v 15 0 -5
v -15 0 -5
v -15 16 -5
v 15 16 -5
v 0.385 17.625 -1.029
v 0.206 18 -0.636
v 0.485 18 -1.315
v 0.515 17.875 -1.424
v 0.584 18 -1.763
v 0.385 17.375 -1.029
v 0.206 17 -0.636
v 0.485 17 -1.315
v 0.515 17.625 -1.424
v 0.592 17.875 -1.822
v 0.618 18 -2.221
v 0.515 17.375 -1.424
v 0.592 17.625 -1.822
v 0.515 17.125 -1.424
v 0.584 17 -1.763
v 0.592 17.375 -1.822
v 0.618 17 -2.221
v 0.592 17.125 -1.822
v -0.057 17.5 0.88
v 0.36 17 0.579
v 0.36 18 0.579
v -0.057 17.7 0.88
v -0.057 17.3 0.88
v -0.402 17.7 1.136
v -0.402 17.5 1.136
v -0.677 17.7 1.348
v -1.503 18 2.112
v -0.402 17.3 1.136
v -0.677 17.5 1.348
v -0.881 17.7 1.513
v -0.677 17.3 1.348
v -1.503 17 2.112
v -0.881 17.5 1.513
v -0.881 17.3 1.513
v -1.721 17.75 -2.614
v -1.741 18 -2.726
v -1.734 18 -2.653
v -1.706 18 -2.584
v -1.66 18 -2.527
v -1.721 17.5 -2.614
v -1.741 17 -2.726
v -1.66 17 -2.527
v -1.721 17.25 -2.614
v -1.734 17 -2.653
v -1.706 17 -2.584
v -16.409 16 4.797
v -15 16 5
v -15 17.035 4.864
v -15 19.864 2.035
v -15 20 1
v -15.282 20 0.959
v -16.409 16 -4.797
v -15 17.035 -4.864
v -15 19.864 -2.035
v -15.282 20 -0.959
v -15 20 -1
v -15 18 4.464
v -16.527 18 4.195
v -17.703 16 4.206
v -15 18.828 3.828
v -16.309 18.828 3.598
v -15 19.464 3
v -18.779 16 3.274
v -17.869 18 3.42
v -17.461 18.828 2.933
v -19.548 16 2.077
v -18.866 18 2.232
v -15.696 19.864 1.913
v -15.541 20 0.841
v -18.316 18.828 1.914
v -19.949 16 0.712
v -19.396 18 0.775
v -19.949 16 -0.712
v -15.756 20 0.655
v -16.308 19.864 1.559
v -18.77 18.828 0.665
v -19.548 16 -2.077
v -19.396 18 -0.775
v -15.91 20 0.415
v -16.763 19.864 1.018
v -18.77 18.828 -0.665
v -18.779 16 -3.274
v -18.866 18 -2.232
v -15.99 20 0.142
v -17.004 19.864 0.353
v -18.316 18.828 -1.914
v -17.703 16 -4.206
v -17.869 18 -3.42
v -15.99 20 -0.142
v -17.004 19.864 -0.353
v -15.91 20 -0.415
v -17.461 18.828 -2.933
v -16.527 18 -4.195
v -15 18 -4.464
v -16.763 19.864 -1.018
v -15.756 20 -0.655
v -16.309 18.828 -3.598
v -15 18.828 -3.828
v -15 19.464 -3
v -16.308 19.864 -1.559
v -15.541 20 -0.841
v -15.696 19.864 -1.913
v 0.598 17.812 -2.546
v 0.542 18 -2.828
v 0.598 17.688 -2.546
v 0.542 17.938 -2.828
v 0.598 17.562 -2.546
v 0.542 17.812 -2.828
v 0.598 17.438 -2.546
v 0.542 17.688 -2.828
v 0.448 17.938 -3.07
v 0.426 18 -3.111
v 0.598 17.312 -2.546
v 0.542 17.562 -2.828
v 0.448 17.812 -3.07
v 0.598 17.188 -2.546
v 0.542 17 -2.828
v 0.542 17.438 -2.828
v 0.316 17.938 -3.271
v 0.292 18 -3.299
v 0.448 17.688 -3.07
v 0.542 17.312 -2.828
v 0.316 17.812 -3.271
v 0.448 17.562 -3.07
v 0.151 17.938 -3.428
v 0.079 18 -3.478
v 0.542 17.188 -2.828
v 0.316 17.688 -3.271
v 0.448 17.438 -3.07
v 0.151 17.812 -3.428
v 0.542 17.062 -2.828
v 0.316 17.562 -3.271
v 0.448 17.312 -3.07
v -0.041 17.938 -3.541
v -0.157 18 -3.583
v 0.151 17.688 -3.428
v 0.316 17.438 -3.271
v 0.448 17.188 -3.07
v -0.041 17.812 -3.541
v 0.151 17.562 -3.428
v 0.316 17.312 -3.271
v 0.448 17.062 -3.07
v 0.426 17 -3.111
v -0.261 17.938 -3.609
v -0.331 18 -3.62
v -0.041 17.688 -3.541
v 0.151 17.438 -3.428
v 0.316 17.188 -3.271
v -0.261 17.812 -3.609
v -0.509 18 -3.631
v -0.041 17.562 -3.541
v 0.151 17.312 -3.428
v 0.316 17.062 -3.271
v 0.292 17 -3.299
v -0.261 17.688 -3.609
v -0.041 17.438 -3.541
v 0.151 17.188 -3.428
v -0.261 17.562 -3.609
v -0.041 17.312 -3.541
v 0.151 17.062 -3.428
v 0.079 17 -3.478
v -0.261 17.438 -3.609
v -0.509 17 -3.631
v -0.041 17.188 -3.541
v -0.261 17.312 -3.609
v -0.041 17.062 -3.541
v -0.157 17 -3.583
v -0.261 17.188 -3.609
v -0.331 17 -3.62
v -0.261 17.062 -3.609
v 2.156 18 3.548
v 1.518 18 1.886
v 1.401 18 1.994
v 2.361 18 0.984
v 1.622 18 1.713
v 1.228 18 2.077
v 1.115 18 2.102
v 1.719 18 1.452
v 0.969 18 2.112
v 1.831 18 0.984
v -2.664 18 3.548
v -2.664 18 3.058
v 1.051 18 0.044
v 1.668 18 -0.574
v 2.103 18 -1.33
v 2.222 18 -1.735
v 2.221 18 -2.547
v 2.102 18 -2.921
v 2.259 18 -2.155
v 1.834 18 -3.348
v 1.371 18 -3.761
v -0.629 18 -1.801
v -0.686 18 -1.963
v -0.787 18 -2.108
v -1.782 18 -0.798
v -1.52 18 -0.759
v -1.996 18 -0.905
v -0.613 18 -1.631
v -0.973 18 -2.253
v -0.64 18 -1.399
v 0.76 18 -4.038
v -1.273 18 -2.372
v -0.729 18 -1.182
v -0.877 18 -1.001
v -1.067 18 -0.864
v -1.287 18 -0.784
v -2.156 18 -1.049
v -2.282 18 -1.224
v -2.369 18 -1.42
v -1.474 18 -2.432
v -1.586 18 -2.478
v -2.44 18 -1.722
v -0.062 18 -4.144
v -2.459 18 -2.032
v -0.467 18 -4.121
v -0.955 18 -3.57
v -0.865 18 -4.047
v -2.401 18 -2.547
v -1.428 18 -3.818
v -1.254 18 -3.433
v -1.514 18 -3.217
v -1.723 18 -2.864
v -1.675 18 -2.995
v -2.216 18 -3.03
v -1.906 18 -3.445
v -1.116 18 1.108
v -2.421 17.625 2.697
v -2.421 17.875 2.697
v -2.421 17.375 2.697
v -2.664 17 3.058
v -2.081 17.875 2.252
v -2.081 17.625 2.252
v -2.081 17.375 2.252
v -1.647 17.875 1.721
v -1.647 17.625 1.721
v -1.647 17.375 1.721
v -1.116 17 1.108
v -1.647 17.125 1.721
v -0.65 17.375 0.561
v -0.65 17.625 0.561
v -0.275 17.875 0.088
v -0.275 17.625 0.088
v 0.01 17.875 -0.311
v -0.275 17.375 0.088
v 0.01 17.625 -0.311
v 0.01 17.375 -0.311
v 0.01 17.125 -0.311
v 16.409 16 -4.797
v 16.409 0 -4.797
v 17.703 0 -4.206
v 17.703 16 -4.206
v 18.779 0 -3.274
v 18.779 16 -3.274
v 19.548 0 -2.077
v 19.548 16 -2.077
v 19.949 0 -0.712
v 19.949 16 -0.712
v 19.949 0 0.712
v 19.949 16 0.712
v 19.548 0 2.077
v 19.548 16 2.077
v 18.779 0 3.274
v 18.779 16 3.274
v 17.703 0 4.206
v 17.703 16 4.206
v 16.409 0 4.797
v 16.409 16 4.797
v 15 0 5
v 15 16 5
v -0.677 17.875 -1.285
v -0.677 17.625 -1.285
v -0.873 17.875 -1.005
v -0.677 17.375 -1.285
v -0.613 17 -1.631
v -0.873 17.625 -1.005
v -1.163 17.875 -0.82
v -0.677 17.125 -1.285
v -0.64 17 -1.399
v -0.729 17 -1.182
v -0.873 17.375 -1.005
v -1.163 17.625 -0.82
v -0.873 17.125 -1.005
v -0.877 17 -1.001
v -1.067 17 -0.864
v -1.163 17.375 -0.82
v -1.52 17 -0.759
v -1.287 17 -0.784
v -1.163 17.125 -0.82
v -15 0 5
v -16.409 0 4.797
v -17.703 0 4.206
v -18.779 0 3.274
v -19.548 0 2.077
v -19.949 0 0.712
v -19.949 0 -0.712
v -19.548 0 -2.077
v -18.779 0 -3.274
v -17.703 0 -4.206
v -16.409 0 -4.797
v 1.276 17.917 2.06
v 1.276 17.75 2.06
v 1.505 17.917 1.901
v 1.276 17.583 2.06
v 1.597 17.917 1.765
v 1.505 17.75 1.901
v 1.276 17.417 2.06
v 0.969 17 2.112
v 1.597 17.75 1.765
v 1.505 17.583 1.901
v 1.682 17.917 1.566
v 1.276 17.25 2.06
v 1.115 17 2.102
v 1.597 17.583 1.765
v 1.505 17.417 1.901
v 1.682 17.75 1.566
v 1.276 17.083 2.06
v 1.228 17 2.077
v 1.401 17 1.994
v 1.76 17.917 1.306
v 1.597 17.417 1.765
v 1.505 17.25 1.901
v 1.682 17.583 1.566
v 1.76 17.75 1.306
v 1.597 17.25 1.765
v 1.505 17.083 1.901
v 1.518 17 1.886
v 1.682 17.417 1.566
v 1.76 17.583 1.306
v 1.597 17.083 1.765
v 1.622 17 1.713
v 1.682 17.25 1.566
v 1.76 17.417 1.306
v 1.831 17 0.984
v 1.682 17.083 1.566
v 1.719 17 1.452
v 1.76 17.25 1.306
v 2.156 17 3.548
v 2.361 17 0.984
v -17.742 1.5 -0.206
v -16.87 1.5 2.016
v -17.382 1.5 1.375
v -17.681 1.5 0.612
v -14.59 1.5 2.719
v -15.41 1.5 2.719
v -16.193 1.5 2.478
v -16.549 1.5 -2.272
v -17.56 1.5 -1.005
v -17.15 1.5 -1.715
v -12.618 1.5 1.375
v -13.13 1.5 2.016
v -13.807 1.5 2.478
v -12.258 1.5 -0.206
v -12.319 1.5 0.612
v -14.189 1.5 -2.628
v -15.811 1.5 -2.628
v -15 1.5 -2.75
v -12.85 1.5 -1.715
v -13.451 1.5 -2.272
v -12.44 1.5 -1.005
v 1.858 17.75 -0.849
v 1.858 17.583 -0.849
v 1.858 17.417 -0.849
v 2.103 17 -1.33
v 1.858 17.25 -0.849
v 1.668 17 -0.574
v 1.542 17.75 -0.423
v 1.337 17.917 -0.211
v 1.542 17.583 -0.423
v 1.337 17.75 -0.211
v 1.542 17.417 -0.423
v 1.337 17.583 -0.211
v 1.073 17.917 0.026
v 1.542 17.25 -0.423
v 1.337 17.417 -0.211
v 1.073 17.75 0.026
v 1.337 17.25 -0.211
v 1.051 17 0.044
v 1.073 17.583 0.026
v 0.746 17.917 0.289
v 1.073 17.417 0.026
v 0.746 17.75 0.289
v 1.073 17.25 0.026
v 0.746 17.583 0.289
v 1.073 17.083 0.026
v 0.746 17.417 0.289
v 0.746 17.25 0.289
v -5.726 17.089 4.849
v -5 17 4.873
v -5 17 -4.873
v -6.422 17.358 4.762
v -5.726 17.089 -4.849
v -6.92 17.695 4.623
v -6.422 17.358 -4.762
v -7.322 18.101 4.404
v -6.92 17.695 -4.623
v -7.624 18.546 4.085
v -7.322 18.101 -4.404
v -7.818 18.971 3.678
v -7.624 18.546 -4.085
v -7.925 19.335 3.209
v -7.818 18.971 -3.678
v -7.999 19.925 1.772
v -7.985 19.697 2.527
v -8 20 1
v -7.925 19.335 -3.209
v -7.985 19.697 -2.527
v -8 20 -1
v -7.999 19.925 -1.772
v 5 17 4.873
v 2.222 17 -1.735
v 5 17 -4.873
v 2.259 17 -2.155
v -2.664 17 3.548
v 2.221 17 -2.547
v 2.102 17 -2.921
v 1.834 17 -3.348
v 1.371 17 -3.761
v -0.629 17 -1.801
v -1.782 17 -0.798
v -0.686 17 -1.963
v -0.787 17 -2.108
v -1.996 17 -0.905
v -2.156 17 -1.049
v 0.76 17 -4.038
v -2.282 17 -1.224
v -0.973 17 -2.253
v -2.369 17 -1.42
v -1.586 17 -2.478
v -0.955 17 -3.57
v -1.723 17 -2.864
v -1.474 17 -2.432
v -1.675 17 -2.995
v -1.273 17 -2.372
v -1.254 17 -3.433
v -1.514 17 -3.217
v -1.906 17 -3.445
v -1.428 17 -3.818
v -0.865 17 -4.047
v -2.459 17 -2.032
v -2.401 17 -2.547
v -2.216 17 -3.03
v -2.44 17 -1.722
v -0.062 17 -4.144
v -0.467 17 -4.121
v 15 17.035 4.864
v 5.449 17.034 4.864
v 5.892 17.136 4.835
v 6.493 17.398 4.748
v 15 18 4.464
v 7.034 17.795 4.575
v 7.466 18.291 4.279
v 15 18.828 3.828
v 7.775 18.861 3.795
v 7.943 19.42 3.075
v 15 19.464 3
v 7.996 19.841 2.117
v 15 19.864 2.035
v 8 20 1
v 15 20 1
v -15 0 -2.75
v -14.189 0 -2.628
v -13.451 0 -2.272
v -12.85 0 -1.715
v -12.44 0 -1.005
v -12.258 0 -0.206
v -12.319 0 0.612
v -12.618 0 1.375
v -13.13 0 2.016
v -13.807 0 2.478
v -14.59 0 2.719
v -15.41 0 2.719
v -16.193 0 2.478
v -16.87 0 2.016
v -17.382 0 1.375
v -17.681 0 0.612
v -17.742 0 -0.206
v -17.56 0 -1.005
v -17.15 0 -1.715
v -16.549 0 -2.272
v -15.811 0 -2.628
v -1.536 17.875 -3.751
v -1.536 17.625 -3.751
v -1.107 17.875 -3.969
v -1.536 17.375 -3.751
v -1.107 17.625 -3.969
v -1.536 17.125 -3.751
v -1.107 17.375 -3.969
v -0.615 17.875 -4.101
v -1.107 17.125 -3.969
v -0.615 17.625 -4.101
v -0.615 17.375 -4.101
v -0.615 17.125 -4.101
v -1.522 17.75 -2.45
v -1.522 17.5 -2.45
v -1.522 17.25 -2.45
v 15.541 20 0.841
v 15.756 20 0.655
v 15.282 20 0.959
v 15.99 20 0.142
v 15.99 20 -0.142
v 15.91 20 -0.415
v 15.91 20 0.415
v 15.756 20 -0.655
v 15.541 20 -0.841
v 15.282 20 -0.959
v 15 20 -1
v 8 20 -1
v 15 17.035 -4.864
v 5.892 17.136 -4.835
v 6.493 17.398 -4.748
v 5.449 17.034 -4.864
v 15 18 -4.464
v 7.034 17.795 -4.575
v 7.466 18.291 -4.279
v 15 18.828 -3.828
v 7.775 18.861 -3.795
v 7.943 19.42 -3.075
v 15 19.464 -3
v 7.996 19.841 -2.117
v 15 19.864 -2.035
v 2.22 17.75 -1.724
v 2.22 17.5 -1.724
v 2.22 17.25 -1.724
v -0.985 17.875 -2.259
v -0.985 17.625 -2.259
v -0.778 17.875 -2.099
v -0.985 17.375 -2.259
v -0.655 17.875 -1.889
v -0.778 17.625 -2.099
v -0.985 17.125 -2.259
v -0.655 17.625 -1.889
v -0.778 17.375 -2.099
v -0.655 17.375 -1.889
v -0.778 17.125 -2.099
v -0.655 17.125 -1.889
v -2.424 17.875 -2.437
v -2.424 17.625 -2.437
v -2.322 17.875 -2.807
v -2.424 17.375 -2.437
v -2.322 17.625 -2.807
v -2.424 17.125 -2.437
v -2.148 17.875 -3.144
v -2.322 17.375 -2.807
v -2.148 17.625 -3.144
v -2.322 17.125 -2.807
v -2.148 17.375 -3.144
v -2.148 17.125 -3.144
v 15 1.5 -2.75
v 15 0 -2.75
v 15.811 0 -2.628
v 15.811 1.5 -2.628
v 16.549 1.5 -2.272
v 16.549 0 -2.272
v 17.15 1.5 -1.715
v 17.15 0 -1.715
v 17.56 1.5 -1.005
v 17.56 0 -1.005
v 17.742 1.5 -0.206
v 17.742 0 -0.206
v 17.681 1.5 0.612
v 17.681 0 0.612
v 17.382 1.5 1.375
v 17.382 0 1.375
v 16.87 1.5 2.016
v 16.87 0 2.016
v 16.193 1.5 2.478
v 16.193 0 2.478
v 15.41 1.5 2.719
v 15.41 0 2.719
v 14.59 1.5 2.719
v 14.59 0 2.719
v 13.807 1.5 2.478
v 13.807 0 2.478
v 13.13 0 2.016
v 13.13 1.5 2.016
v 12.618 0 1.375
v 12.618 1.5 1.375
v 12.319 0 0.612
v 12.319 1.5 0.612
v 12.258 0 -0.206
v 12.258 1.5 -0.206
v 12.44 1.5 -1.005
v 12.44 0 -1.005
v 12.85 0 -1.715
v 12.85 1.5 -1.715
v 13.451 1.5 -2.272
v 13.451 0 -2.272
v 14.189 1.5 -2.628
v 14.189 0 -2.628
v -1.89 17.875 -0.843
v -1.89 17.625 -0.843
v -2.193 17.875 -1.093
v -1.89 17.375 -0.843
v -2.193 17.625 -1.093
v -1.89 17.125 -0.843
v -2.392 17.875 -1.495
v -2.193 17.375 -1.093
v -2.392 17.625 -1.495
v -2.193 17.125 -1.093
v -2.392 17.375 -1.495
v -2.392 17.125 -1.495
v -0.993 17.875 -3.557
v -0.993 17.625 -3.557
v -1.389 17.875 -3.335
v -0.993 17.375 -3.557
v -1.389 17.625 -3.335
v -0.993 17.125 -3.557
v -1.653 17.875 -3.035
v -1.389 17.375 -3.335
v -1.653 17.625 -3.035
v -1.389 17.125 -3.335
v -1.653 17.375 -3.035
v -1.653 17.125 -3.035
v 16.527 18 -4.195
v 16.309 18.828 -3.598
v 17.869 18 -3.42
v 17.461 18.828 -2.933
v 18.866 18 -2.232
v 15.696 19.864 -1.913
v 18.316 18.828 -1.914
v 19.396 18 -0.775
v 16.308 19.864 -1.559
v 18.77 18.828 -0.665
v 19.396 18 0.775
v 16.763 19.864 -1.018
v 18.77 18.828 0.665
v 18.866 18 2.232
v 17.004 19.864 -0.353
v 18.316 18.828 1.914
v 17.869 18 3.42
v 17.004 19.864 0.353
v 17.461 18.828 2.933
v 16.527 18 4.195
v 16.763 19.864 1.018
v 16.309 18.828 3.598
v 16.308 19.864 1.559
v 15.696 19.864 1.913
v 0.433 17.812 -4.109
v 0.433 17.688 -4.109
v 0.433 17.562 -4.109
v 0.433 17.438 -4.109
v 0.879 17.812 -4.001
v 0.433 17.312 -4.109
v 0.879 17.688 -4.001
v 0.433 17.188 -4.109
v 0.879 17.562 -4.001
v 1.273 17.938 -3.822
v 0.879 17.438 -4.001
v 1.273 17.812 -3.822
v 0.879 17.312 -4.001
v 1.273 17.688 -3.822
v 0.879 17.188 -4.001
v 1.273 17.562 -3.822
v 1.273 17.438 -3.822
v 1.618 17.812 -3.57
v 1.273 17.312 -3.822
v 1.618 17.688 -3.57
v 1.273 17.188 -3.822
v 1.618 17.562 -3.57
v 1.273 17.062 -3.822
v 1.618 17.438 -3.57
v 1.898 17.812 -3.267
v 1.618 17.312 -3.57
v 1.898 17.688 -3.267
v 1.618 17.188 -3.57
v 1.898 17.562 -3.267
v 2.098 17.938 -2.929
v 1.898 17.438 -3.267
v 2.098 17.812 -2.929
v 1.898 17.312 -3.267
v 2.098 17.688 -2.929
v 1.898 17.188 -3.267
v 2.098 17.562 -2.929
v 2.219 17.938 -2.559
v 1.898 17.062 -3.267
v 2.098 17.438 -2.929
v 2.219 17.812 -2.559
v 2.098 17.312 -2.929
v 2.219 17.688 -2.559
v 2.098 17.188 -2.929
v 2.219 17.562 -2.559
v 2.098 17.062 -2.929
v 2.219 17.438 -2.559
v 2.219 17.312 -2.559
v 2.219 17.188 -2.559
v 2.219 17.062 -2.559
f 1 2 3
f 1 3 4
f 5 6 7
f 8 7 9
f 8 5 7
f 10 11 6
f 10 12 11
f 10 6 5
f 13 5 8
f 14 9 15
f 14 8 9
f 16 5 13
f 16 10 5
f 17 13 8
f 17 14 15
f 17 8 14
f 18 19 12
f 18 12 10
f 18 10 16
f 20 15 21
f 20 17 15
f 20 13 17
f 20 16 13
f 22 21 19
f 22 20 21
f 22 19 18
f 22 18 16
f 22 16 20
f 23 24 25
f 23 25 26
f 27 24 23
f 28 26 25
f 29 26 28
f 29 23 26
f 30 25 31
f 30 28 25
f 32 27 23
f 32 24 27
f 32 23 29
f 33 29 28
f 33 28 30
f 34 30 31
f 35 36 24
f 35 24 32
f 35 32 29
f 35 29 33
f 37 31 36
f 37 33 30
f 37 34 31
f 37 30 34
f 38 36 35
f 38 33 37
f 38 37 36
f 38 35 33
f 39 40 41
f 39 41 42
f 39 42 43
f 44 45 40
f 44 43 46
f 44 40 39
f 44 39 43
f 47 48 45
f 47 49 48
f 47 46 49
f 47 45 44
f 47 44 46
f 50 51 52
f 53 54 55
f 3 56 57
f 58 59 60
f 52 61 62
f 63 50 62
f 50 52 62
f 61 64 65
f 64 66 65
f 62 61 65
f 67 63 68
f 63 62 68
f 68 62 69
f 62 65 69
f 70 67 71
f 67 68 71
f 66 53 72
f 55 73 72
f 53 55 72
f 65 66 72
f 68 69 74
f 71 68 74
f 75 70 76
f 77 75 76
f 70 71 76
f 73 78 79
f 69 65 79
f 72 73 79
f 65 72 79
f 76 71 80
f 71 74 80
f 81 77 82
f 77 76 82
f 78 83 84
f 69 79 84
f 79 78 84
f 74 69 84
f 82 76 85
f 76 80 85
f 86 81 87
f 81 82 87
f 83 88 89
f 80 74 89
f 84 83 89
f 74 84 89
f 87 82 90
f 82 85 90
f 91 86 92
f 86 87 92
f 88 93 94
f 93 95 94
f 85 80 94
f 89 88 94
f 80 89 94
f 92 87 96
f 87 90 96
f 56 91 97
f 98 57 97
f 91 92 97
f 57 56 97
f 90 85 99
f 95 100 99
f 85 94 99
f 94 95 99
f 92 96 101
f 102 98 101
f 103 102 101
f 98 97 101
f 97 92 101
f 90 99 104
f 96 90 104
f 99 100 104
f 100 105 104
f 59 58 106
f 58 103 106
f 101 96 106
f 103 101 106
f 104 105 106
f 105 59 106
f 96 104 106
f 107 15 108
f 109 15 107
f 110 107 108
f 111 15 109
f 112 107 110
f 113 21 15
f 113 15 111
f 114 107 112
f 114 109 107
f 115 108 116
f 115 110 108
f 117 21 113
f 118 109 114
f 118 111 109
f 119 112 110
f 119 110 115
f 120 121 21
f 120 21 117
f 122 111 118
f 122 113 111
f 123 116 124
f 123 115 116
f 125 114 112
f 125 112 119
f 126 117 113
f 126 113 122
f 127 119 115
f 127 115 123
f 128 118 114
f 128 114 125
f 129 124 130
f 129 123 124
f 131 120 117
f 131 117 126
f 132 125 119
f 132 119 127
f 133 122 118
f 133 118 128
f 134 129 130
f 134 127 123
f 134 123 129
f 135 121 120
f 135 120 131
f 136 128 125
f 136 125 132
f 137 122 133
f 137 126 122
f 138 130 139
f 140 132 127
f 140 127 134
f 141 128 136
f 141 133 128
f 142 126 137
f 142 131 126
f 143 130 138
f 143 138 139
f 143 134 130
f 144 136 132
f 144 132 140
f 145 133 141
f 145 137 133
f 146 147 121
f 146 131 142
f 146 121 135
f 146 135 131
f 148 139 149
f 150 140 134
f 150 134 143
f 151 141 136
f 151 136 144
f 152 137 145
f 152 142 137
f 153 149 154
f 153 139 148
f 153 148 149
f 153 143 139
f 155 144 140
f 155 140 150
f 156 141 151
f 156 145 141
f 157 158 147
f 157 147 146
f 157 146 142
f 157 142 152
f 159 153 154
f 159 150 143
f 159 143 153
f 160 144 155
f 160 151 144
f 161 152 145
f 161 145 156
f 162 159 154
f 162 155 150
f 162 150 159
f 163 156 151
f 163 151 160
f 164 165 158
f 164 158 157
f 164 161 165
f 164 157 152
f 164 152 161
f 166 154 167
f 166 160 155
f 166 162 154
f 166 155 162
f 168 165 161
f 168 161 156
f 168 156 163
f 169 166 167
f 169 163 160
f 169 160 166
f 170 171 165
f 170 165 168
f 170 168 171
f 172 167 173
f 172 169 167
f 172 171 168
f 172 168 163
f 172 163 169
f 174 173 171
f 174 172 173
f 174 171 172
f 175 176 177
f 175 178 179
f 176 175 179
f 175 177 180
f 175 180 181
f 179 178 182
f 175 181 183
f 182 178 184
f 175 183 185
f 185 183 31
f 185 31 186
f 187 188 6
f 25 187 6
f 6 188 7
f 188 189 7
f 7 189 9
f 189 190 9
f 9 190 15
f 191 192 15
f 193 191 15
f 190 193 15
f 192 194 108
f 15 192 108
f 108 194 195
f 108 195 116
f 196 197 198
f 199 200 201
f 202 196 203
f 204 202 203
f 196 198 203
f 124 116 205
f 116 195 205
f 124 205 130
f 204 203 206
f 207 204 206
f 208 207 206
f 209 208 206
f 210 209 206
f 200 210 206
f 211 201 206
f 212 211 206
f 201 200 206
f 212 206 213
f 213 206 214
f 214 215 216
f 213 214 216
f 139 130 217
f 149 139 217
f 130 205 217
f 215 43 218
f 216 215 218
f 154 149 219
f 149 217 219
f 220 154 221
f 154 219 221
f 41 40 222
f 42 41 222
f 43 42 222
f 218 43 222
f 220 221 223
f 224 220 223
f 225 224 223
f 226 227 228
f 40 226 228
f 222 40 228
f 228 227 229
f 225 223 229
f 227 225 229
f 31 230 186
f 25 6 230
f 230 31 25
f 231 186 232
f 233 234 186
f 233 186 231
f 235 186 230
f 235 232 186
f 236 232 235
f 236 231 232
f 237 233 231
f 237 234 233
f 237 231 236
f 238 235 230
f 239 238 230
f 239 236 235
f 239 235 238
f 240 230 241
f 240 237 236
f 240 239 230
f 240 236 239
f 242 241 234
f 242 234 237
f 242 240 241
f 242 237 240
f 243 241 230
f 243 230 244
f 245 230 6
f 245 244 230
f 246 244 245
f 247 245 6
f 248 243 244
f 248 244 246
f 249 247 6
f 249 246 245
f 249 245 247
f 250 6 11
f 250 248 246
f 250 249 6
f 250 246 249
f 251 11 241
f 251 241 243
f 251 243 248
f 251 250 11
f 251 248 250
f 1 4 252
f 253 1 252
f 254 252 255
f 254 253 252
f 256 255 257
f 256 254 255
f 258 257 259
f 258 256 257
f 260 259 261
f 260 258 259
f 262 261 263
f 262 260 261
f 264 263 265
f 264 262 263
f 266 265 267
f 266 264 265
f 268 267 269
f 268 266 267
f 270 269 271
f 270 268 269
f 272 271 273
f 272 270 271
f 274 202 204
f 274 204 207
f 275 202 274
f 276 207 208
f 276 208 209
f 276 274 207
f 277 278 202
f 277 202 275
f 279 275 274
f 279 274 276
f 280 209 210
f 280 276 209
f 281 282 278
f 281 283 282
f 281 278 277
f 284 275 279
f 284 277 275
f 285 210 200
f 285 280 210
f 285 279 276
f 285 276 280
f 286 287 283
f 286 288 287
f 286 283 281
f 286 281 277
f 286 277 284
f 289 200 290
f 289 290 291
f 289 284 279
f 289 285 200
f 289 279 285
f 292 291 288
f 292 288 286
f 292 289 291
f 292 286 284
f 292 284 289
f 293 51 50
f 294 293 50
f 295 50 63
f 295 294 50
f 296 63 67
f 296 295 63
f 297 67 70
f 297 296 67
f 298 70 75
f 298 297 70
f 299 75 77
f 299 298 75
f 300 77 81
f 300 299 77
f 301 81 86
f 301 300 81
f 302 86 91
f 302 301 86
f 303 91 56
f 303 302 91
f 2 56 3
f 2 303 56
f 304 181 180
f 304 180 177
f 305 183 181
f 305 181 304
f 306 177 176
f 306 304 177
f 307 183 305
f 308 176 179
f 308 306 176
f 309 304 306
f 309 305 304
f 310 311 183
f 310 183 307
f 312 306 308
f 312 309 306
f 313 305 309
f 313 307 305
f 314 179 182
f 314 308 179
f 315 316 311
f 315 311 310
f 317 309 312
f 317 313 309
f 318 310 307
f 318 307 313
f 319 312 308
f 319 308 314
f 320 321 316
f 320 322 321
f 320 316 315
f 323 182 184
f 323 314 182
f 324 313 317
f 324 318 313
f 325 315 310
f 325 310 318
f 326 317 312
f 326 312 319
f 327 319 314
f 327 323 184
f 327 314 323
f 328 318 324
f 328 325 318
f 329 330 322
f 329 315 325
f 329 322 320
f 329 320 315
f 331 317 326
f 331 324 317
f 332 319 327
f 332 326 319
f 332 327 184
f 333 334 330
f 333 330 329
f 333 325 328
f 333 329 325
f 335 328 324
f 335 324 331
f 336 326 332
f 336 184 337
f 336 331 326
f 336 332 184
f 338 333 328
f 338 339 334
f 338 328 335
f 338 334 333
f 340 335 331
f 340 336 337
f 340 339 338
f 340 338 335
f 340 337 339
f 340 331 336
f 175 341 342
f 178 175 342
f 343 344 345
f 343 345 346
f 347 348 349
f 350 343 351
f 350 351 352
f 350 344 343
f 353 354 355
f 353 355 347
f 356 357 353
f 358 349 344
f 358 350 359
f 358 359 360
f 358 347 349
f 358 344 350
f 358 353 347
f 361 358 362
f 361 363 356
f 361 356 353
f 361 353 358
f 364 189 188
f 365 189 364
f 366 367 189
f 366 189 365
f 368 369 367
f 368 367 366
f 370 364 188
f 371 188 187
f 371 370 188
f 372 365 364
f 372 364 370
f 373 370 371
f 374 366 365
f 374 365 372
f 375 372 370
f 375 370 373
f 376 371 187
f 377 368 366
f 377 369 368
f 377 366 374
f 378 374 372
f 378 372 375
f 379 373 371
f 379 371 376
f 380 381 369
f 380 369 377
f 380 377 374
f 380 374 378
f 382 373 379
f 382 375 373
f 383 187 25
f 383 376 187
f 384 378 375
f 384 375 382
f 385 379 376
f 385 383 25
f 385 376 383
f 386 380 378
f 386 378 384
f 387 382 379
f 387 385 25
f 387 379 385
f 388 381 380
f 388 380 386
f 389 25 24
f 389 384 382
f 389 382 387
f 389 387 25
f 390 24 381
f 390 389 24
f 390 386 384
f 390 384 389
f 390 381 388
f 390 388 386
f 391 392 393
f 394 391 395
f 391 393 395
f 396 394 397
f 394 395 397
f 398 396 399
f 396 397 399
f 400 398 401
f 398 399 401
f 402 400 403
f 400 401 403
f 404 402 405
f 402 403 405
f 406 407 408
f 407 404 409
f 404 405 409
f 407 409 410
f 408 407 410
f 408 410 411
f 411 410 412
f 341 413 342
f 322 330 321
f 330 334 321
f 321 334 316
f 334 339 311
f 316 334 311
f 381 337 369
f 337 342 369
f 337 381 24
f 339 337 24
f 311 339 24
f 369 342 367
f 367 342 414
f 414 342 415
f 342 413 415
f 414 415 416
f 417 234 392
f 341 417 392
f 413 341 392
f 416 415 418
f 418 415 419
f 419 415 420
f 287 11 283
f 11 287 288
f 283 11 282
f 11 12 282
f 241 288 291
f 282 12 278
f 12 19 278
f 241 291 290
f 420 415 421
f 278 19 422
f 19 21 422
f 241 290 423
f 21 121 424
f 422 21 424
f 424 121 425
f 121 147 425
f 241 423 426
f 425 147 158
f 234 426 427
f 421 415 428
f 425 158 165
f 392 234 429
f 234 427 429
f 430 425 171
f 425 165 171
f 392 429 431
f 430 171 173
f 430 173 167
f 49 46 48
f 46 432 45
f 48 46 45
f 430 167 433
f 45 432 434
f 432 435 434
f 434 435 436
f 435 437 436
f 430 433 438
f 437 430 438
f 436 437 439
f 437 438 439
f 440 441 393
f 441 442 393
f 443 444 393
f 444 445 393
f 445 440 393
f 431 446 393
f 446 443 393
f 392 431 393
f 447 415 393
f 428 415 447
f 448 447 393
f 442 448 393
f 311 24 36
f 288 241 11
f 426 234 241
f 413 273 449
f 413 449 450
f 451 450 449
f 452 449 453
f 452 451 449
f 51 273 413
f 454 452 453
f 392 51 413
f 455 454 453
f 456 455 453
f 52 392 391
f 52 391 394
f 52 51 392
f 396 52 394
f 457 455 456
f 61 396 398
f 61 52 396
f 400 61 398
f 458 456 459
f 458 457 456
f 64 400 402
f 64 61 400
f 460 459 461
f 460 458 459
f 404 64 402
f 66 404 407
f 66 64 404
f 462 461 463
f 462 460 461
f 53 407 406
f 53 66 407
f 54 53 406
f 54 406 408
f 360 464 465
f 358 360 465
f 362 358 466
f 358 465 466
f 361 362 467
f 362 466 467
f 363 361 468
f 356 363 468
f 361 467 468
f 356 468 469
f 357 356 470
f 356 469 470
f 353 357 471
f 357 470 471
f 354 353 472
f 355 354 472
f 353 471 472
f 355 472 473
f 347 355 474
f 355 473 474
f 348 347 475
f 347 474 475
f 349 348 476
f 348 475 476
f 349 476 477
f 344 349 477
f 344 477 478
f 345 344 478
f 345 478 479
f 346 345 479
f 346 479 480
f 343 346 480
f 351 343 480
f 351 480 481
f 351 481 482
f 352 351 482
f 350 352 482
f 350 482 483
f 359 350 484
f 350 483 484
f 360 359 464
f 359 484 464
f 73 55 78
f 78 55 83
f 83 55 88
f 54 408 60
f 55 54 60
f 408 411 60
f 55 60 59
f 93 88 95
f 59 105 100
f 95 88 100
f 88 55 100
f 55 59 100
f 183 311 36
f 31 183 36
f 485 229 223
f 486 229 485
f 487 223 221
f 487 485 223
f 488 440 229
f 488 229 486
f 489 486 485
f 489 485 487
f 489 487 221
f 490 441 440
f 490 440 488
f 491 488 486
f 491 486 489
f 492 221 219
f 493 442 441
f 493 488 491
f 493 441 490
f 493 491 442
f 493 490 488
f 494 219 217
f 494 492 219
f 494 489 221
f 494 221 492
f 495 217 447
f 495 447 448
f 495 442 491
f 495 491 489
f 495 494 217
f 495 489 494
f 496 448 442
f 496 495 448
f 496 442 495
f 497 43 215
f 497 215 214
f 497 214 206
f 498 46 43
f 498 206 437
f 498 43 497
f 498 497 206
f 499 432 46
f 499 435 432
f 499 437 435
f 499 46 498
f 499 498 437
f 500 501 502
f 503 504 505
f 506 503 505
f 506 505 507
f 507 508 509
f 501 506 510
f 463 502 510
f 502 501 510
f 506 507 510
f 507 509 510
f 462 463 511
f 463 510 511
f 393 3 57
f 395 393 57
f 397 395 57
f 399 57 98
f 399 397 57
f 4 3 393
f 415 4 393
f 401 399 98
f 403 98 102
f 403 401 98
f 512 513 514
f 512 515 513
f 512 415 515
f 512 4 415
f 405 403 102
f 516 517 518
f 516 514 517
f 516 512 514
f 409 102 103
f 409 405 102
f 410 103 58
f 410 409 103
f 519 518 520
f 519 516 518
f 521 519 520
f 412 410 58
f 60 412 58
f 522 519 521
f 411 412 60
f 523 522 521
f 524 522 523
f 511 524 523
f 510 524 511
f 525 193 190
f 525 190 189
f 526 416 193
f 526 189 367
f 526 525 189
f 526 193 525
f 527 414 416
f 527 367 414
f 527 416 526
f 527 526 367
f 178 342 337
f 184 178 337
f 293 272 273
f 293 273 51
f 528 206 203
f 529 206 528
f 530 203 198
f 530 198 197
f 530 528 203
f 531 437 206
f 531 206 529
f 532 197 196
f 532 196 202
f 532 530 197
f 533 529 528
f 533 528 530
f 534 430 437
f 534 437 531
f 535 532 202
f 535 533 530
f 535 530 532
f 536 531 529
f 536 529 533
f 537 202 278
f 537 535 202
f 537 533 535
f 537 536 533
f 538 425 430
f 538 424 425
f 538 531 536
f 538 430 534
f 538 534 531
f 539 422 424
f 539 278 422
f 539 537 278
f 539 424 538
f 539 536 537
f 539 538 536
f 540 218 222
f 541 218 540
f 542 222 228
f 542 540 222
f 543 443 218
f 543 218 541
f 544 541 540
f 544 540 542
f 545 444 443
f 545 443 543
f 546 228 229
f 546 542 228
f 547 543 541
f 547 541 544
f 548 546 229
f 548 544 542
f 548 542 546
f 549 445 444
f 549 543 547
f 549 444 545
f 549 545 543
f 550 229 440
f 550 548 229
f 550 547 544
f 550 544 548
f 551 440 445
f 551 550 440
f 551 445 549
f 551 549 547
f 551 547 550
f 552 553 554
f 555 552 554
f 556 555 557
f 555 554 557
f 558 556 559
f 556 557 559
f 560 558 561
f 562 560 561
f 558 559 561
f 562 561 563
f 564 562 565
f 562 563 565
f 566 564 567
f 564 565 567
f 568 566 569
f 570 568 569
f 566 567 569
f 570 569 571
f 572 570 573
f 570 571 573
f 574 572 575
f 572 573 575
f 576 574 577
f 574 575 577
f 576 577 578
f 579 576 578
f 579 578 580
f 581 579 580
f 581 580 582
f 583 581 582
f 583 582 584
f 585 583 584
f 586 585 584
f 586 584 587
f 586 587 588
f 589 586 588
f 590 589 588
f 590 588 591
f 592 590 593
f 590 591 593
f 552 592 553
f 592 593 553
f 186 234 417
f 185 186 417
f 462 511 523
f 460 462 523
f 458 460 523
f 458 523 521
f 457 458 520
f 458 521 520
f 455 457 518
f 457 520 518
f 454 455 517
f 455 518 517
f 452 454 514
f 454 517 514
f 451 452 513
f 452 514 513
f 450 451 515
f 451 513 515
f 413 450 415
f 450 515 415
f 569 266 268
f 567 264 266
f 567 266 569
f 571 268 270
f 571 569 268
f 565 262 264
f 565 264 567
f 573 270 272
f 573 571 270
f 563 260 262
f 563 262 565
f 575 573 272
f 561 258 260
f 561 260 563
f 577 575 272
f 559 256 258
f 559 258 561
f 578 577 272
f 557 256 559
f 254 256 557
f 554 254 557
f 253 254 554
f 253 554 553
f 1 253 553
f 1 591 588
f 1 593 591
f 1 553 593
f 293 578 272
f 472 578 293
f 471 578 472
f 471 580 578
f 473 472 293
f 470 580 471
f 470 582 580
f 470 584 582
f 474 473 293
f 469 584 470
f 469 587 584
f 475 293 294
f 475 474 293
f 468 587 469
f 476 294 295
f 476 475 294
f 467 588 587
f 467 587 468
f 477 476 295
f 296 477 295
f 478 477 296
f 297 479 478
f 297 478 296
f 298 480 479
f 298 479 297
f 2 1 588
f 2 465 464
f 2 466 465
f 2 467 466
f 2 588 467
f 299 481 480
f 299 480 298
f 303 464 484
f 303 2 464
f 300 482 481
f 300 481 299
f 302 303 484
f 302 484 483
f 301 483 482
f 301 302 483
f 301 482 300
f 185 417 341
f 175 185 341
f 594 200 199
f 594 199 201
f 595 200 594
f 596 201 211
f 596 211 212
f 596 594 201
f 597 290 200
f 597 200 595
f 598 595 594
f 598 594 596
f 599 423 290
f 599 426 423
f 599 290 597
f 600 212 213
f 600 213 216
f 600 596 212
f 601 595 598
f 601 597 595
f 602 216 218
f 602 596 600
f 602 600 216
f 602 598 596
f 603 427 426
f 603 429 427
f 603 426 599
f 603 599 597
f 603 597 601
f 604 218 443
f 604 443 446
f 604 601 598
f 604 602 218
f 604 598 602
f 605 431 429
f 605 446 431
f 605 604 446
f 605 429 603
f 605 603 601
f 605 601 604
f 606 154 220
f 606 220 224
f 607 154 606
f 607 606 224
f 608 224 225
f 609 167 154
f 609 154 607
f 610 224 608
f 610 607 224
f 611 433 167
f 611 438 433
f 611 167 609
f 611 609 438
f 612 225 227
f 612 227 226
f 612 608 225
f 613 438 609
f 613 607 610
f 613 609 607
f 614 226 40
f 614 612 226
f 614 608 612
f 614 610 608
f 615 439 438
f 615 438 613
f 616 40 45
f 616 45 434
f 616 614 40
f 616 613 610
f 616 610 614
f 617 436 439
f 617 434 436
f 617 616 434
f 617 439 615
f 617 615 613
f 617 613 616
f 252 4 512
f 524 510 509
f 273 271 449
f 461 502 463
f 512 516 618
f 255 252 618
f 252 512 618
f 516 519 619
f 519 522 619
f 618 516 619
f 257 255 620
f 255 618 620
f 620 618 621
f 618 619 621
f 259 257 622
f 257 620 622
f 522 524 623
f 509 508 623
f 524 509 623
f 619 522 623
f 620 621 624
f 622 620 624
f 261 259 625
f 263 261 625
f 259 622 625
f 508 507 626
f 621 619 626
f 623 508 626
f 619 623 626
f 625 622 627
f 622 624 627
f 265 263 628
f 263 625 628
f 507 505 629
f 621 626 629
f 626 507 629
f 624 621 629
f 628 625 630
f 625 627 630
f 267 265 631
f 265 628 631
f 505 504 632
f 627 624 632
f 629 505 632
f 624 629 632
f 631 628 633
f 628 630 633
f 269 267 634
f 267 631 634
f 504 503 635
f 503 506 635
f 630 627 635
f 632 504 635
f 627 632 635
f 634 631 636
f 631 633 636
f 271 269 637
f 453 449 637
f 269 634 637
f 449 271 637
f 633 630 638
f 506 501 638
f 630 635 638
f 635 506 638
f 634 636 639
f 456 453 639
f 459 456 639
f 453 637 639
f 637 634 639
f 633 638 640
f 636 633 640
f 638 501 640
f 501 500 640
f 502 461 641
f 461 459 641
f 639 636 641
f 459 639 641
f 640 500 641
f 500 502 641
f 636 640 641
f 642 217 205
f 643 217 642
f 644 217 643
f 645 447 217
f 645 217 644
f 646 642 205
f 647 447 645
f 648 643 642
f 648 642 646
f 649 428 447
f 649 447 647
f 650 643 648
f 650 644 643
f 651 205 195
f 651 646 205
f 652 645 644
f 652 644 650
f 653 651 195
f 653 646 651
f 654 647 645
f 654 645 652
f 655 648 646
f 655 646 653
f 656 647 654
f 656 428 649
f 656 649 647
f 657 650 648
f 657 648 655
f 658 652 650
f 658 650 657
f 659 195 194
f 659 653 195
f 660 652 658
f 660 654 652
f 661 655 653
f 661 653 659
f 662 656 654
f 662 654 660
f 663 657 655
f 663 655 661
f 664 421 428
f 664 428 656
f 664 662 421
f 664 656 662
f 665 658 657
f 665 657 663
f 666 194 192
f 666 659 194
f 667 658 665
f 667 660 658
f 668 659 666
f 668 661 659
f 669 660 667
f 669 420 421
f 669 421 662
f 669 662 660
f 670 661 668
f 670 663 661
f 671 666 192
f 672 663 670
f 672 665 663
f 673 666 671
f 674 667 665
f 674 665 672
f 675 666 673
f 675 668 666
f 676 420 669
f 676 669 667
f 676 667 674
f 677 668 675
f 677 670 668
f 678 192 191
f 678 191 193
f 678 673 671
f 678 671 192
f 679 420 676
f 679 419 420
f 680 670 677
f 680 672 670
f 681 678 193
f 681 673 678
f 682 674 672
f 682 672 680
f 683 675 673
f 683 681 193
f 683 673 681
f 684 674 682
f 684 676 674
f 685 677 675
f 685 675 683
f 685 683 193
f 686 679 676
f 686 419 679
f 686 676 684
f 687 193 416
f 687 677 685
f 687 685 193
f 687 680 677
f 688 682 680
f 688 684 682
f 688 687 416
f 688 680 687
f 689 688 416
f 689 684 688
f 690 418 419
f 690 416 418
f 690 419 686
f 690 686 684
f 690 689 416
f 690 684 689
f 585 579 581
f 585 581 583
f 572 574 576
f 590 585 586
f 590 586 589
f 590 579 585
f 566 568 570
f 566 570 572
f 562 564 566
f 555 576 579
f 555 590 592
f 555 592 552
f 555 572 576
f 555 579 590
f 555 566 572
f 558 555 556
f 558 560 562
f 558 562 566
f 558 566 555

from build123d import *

# Parameters (mm, degrees)
BOSS_EXTRUDE1_DEPTH     = 20
FILLET1_R               = 4
SKETCH2_R               = 2.75
CUT_EXTRUDE1_DEPTH      = 1.5
LPATTERN1_COUNT         = 2
LPATTERN1_PITCH         = 30
CUT_EXTRUDE2_DEPTH      = 29.722813233
CUT_EXTRUDE2_DEPTH_BACK = 29.722813233
WRAP1_DEPTH             = 1


# Read off the part's stored shape, not the designer's step: Wrap1
with BuildPart() as part:
    # Sketch1 → Boss-Extrude1 (new body)
    with BuildSketch(Plane(origin=(0, 0, 0), x_dir=(1, 0, 0), z_dir=(0, 1, 0))):
        with BuildLine():
            Line((15, -5), (-15, -5))
            ThreePointArc((-15, -5), (-20, 0), (-15, 5))
            Line((-15, 5), (15, 5))
            ThreePointArc((15, 5), (20, 0), (15, -5))
        make_face()
    extrude(amount=BOSS_EXTRUDE1_DEPTH)

    # Fillet1
    fillet1_edges = [part.edges().sort_by_distance(p)[0] for p in [
        (-20, 20, 0),
        (0, 20, 5),
        (20, 20, 0),
        (0, 20, -5),
    ]]
    fillet(fillet1_edges, radius=FILLET1_R)

    # Sketch2 → Cut-Extrude1 (cut)
    with BuildSketch(Plane.XZ):
        with Locations(Location((-15, 0, 0), (0, 0, 270))):
            Circle(SKETCH2_R)
    cut_extrude1 = extrude(amount=-CUT_EXTRUDE1_DEPTH, mode=Mode.SUBTRACT)

    # LPattern1: Cut-Extrude1 ×2
    with Locations(*[(i * LPATTERN1_PITCH, 0, 0) for i in range(1, LPATTERN1_COUNT)]):
        add(cut_extrude1, mode=Mode.SUBTRACT)

    # Sketch3 → Cut-Extrude2 (cut, two sides: drawn at the far end of the back side and taken through both)
    with BuildSketch(Plane.XY.offset(-CUT_EXTRUDE2_DEPTH_BACK)):
        with BuildLine():
            Line((-5, 23), (5, 23))
            ThreePointArc((5, 23), (8, 20), (5, 17))
            Line((5, 17), (-5, 17))
            ThreePointArc((-5, 17), (-8, 20), (-5, 23))
        make_face()
    extrude(amount=CUT_EXTRUDE2_DEPTH + CUT_EXTRUDE2_DEPTH_BACK, mode=Mode.SUBTRACT)

    # Wrap1 outline → Wrap1 (add)
    with BuildSketch(Plane(origin=(0, 17, 0), x_dir=(1, 0, 0), z_dir=(0, 1, 0))):
        with BuildLine():
            add(Edge.make_bspline(
                [(0.968558604, -2.112404227), (1.023340463, -2.110381468), (1.128135866, -2.106512015), (1.275421614, -2.065066433), (1.40411806, -1.999153831), (1.494113345, -1.918796765), (1.555259283, -1.8377784), (1.600182088, -1.761379971), (1.643056037, -1.669468115), (1.68410688, -1.562162987), (1.724115658, -1.439672484), (1.762787282, -1.301883834), (1.796828359, -1.147944523), (1.819117415, -1.040313742), (1.830738091, -0.984199098)],
                knots=[0, 0, 0, 0, 0.10403341, 0.199011557, 0.288612319, 0.377191825, 0.425797175, 0.481425289, 0.545557079, 0.61863331, 0.699984683, 0.790771883, 0.890916323, 1, 1, 1, 1], degree=3))
            Line((0.968558604, -2.112404227), (-1.502595242, -2.112404227))
            add(Edge.make_bspline(
                [(0.359584245, -0.57875038), (0.287589412, -0.631266446), (0.149119993, -0.732271876), (-0.052040125, -0.874957595), (-0.232151558, -1.010570949), (-0.396984875, -1.13231455), (-0.543079134, -1.243803459), (-0.672030163, -1.343433338), (-0.782764208, -1.43141572), (-0.961872458, -1.579798827), (-1.207220157, -1.798528227), (-1.40469562, -2.00837263), (-1.502595242, -2.112404227)],
                knots=[0, 0, 0, 0, 0.110593572, 0.212707314, 0.306051588, 0.390379305, 0.467018215, 0.534117187, 0.592614819, 0.642525788, 0.822780058, 1, 1, 1, 1], degree=3))
            add(Edge.make_bspline(
                [(2.103173989, 1.329903466), (2.066781163, 1.246346618), (1.99482956, 1.081147874), (1.86047631, 0.847661593), (1.71297016, 0.626020413), (1.571074283, 0.452909604), (1.445054335, 0.315568643), (1.334068385, 0.207346612), (1.208958187, 0.091994137), (1.069166496, -0.030104), (0.913592831, -0.158279882), (0.741560734, -0.29208501), (0.556771712, -0.435146764), (0.42660857, -0.529939289), (0.359584245, -0.57875038)],
                knots=[0, 0, 0, 0, 0.10413489, 0.205883221, 0.307528832, 0.408265615, 0.461433854, 0.520606469, 0.585444086, 0.656004792, 0.732803839, 0.815893726, 0.905198979, 1, 1, 1, 1], degree=3))
            add(Edge.make_bspline(
                [(2.258622707, 2.155223979), (2.256854974, 2.081406691), (2.253395008, 1.936924834), (2.223825952, 1.724789841), (2.174767432, 1.522306219), (2.126875674, 1.393600214), (2.103173989, 1.329903466)],
                knots=[0, 0, 0, 0, 0.261979501, 0.512769921, 0.758869279, 1, 1, 1, 1], degree=3))
            add(Edge.make_bspline(
                [(-0.061890114, 4.14400603), (0.022564629, 4.141920306), (0.18812583, 4.13783155), (0.430620451, 4.112847977), (0.660471364, 4.067558501), (0.878305178, 4.005888588), (1.082018473, 3.923000729), (1.274759097, 3.825795699), (1.453280397, 3.707304776), (1.618929442, 3.573545968), (1.768923738, 3.427244365), (1.900049838, 3.270535022), (2.011299511, 3.105351175), (2.101257211, 2.93081783), (2.172841542, 2.749020464), (2.221753805, 2.558426678), (2.253872753, 2.359840276), (2.257020026, 2.224263519), (2.258622707, 2.155223979)],
                knots=[0, 0, 0, 0, 0.074102612, 0.14526736, 0.21355926, 0.279416432, 0.343556942, 0.406228654, 0.468492489, 0.531146675, 0.592790073, 0.652016559, 0.710119813, 0.767135501, 0.823967905, 0.881147087, 0.939476717, 1, 1, 1, 1], degree=3))
            add(Edge.make_bspline(
                [(-1.906441396, 3.445288081), (-1.848306189, 3.501112989), (-1.732554849, 3.612264359), (-1.538609793, 3.754854821), (-1.330466242, 3.876473687), (-1.105791254, 3.973994027), (-0.866480346, 4.051164268), (-0.611446439, 4.105367467), (-0.341562002, 4.137488539), (-0.156530269, 4.14180053), (-0.061890114, 4.14400603)],
                knots=[0, 0, 0, 0, 0.119107626, 0.23715177, 0.355050392, 0.47498588, 0.598670295, 0.726365388, 0.860041186, 1, 1, 1, 1], degree=3))
            add(Edge.make_bspline(
                [(-2.459326011, 2.031826543), (-2.458122329, 2.10083777), (-2.455751672, 2.236755643), (-2.42704922, 2.435648535), (-2.383831572, 2.625974396), (-2.325084873, 2.808678323), (-2.245799792, 2.981581962), (-2.150493697, 3.146407777), (-2.038697096, 3.303051555), (-1.950794522, 3.397587797), (-1.906441396, 3.445288081)],
                knots=[0, 0, 0, 0, 0.132803649, 0.26155729, 0.386082589, 0.508400008, 0.630401232, 0.751619273, 0.874674186, 1, 1, 1, 1], degree=3))
            add(Edge.make_bspline(
                [(-1.520223447, 0.759390645), (-1.585420599, 0.763118791), (-1.713143024, 0.770422298), (-1.895082142, 0.836934937), (-2.058691576, 0.943915448), (-2.201841078, 1.092044894), (-2.320121913, 1.277705611), (-2.399559254, 1.501224402), (-2.452612405, 1.75530448), (-2.457009968, 1.936432658), (-2.459326011, 2.031826543)],
                knots=[0, 0, 0, 0, 0.110139331, 0.215764983, 0.323707128, 0.438906263, 0.562183724, 0.693638164, 0.838649921, 1, 1, 1, 1], degree=3))
            add(Edge.make_bspline(
                [(-0.613172165, 1.631185517), (-0.616054345, 1.570486701), (-0.621662157, 1.45238594), (-0.671323685, 1.283175242), (-0.754629801, 1.131365188), (-0.869218028, 1.000302814), (-1.00648217, 0.893380798), (-1.162575656, 0.81342959), (-1.336719307, 0.768952542), (-1.458017598, 0.762632021), (-1.520223447, 0.759390645)],
                knots=[0, 0, 0, 0, 0.129242333, 0.251464839, 0.372304265, 0.495878621, 0.620081591, 0.741344555, 0.867352775, 1, 1, 1, 1], degree=3))
            add(Edge.make_bspline(
                [(-1.273428575, 2.371570132), (-1.221111857, 2.356431424), (-1.121681232, 2.327659528), (-0.986315759, 2.264054818), (-0.872118751, 2.188748181), (-0.775565412, 2.103031066), (-0.702763657, 2.001965174), (-0.650977929, 1.888692008), (-0.61737495, 1.763975364), (-0.614599413, 1.676280399), (-0.613172165, 1.631185517)],
                knots=[0, 0, 0, 0, 0.151156851, 0.287281401, 0.413669873, 0.530293514, 0.644009236, 0.756908248, 0.874996313, 1, 1, 1, 1], degree=3))
            add(Edge.make_bspline(
                [(-1.659646524, 2.52701885), (-1.641908981, 2.5134804), (-1.599762076, 2.48131113), (-1.513799429, 2.446453071), (-1.403911325, 2.405291879), (-1.319666952, 2.383519902), (-1.273428575, 2.371570132)],
                knots=[0, 0, 0, 0, 0.159109439, 0.378066483, 0.65864549, 1, 1, 1, 1], degree=3))
            add(Edge.make_bspline(
                [(-1.741377293, 2.725736799), (-1.740702967, 2.705828636), (-1.739402264, 2.667427893), (-1.722346439, 2.613602242), (-1.696843256, 2.565494988), (-1.672067897, 2.539867464), (-1.659646524, 2.52701885)],
                knots=[0, 0, 0, 0, 0.268945253, 0.518766978, 0.758729042, 1, 1, 1, 1], degree=3))
            add(Edge.make_bspline(
                [(-0.509005498, 3.631185517), (-0.593702292, 3.627478268), (-0.757485819, 3.620309328), (-0.992510379, 3.565399378), (-1.204920463, 3.4708981), (-1.388970755, 3.342097951), (-1.54050767, 3.195942921), (-1.655393233, 3.044422755), (-1.727025811, 2.886507887), (-1.736695124, 2.778188345), (-1.741377293, 2.725736799)],
                knots=[0, 0, 0, 0, 0.151816317, 0.293576777, 0.429964406, 0.566304914, 0.694365033, 0.806085808, 0.906100976, 1, 1, 1, 1], degree=3))
            add(Edge.make_bspline(
                [(0.617597066, 2.220929107), (0.616798314, 2.277062503), (0.615251229, 2.385786079), (0.599863671, 2.542997259), (0.579004071, 2.690242583), (0.544058374, 2.826348498), (0.504153512, 2.954009696), (0.449772713, 3.069509609), (0.389899195, 3.176431124), (0.318093883, 3.271087373), (0.240513737, 3.356936451), (0.152380296, 3.428872442), (0.059506725, 3.491963217), (-0.040243661, 3.543993611), (-0.147906764, 3.581901434), (-0.261368703, 3.611540097), (-0.38306343, 3.626855058), (-0.466235221, 3.629714881), (-0.509005498, 3.631185517)],
                knots=[0, 0, 0, 0, 0.082284271, 0.159374645, 0.231497254, 0.300083139, 0.36523236, 0.427274673, 0.486932074, 0.544586116, 0.60112786, 0.656190593, 0.710940404, 0.765594865, 0.820607428, 0.877984079, 0.93725451, 1, 1, 1, 1], degree=3))
            add(Edge.make_bspline(
                [(0.205738091, 0.635993209), (0.238640814, 0.700768661), (0.303861654, 0.829168655), (0.385865127, 1.026897746), (0.459663901, 1.22391557), (0.516579645, 1.422967903), (0.561905142, 1.621957205), (0.593823909, 1.82108009), (0.613938148, 2.020726724), (0.616375849, 2.154108657), (0.617597066, 2.220929107)],
                knots=[0, 0, 0, 0, 0.131745637, 0.261150462, 0.388067803, 0.513189353, 0.636374668, 0.758087597, 0.878808958, 1, 1, 1, 1], degree=3))
            add(Edge.make_bspline(
                [(-1.116377293, -1.107596534), (-1.03496234, -1.013767374), (-0.878016077, -0.832889839), (-0.655626445, -0.569536189), (-0.456135085, -0.32390871), (-0.280159151, -0.096566641), (-0.125247461, 0.111659158), (0.00577288, 0.302221735), (0.116680709, 0.473318508), (0.177475044, 0.584367138), (0.205738091, 0.635993209)],
                knots=[0, 0, 0, 0, 0.170005554, 0.327725258, 0.471696803, 0.603008639, 0.721148947, 0.826797124, 0.919478664, 1, 1, 1, 1], degree=3))
            add(Edge.make_bspline(
                [(-2.664454216, -3.057917047), (-2.628698989, -3.000910883), (-2.55158858, -2.877970296), (-2.41479269, -2.688825323), (-2.259314405, -2.474715573), (-2.074551732, -2.243606397), (-1.870318919, -1.988170585), (-1.640593125, -1.712928149), (-1.387471618, -1.416348269), (-1.20904993, -1.213142224), (-1.116377293, -1.107596534)],
                knots=[0, 0, 0, 0, 0.080973991, 0.174630064, 0.280853316, 0.39944862, 0.530692677, 0.674513651, 0.830941638, 1, 1, 1, 1], degree=3))
            Line((-2.664454216, -3.057917047), (-2.664454216, -3.548301662))
            Line((-2.664454216, -3.548301662), (2.156058604, -3.548301662))
            Line((2.156058604, -3.548301662), (2.361186809, -0.984199098))
            Line((2.361186809, -0.984199098), (1.830738091, -0.984199098))
        make_face()
    extrude(amount=WRAP1_DEPTH)


solid = part.part
